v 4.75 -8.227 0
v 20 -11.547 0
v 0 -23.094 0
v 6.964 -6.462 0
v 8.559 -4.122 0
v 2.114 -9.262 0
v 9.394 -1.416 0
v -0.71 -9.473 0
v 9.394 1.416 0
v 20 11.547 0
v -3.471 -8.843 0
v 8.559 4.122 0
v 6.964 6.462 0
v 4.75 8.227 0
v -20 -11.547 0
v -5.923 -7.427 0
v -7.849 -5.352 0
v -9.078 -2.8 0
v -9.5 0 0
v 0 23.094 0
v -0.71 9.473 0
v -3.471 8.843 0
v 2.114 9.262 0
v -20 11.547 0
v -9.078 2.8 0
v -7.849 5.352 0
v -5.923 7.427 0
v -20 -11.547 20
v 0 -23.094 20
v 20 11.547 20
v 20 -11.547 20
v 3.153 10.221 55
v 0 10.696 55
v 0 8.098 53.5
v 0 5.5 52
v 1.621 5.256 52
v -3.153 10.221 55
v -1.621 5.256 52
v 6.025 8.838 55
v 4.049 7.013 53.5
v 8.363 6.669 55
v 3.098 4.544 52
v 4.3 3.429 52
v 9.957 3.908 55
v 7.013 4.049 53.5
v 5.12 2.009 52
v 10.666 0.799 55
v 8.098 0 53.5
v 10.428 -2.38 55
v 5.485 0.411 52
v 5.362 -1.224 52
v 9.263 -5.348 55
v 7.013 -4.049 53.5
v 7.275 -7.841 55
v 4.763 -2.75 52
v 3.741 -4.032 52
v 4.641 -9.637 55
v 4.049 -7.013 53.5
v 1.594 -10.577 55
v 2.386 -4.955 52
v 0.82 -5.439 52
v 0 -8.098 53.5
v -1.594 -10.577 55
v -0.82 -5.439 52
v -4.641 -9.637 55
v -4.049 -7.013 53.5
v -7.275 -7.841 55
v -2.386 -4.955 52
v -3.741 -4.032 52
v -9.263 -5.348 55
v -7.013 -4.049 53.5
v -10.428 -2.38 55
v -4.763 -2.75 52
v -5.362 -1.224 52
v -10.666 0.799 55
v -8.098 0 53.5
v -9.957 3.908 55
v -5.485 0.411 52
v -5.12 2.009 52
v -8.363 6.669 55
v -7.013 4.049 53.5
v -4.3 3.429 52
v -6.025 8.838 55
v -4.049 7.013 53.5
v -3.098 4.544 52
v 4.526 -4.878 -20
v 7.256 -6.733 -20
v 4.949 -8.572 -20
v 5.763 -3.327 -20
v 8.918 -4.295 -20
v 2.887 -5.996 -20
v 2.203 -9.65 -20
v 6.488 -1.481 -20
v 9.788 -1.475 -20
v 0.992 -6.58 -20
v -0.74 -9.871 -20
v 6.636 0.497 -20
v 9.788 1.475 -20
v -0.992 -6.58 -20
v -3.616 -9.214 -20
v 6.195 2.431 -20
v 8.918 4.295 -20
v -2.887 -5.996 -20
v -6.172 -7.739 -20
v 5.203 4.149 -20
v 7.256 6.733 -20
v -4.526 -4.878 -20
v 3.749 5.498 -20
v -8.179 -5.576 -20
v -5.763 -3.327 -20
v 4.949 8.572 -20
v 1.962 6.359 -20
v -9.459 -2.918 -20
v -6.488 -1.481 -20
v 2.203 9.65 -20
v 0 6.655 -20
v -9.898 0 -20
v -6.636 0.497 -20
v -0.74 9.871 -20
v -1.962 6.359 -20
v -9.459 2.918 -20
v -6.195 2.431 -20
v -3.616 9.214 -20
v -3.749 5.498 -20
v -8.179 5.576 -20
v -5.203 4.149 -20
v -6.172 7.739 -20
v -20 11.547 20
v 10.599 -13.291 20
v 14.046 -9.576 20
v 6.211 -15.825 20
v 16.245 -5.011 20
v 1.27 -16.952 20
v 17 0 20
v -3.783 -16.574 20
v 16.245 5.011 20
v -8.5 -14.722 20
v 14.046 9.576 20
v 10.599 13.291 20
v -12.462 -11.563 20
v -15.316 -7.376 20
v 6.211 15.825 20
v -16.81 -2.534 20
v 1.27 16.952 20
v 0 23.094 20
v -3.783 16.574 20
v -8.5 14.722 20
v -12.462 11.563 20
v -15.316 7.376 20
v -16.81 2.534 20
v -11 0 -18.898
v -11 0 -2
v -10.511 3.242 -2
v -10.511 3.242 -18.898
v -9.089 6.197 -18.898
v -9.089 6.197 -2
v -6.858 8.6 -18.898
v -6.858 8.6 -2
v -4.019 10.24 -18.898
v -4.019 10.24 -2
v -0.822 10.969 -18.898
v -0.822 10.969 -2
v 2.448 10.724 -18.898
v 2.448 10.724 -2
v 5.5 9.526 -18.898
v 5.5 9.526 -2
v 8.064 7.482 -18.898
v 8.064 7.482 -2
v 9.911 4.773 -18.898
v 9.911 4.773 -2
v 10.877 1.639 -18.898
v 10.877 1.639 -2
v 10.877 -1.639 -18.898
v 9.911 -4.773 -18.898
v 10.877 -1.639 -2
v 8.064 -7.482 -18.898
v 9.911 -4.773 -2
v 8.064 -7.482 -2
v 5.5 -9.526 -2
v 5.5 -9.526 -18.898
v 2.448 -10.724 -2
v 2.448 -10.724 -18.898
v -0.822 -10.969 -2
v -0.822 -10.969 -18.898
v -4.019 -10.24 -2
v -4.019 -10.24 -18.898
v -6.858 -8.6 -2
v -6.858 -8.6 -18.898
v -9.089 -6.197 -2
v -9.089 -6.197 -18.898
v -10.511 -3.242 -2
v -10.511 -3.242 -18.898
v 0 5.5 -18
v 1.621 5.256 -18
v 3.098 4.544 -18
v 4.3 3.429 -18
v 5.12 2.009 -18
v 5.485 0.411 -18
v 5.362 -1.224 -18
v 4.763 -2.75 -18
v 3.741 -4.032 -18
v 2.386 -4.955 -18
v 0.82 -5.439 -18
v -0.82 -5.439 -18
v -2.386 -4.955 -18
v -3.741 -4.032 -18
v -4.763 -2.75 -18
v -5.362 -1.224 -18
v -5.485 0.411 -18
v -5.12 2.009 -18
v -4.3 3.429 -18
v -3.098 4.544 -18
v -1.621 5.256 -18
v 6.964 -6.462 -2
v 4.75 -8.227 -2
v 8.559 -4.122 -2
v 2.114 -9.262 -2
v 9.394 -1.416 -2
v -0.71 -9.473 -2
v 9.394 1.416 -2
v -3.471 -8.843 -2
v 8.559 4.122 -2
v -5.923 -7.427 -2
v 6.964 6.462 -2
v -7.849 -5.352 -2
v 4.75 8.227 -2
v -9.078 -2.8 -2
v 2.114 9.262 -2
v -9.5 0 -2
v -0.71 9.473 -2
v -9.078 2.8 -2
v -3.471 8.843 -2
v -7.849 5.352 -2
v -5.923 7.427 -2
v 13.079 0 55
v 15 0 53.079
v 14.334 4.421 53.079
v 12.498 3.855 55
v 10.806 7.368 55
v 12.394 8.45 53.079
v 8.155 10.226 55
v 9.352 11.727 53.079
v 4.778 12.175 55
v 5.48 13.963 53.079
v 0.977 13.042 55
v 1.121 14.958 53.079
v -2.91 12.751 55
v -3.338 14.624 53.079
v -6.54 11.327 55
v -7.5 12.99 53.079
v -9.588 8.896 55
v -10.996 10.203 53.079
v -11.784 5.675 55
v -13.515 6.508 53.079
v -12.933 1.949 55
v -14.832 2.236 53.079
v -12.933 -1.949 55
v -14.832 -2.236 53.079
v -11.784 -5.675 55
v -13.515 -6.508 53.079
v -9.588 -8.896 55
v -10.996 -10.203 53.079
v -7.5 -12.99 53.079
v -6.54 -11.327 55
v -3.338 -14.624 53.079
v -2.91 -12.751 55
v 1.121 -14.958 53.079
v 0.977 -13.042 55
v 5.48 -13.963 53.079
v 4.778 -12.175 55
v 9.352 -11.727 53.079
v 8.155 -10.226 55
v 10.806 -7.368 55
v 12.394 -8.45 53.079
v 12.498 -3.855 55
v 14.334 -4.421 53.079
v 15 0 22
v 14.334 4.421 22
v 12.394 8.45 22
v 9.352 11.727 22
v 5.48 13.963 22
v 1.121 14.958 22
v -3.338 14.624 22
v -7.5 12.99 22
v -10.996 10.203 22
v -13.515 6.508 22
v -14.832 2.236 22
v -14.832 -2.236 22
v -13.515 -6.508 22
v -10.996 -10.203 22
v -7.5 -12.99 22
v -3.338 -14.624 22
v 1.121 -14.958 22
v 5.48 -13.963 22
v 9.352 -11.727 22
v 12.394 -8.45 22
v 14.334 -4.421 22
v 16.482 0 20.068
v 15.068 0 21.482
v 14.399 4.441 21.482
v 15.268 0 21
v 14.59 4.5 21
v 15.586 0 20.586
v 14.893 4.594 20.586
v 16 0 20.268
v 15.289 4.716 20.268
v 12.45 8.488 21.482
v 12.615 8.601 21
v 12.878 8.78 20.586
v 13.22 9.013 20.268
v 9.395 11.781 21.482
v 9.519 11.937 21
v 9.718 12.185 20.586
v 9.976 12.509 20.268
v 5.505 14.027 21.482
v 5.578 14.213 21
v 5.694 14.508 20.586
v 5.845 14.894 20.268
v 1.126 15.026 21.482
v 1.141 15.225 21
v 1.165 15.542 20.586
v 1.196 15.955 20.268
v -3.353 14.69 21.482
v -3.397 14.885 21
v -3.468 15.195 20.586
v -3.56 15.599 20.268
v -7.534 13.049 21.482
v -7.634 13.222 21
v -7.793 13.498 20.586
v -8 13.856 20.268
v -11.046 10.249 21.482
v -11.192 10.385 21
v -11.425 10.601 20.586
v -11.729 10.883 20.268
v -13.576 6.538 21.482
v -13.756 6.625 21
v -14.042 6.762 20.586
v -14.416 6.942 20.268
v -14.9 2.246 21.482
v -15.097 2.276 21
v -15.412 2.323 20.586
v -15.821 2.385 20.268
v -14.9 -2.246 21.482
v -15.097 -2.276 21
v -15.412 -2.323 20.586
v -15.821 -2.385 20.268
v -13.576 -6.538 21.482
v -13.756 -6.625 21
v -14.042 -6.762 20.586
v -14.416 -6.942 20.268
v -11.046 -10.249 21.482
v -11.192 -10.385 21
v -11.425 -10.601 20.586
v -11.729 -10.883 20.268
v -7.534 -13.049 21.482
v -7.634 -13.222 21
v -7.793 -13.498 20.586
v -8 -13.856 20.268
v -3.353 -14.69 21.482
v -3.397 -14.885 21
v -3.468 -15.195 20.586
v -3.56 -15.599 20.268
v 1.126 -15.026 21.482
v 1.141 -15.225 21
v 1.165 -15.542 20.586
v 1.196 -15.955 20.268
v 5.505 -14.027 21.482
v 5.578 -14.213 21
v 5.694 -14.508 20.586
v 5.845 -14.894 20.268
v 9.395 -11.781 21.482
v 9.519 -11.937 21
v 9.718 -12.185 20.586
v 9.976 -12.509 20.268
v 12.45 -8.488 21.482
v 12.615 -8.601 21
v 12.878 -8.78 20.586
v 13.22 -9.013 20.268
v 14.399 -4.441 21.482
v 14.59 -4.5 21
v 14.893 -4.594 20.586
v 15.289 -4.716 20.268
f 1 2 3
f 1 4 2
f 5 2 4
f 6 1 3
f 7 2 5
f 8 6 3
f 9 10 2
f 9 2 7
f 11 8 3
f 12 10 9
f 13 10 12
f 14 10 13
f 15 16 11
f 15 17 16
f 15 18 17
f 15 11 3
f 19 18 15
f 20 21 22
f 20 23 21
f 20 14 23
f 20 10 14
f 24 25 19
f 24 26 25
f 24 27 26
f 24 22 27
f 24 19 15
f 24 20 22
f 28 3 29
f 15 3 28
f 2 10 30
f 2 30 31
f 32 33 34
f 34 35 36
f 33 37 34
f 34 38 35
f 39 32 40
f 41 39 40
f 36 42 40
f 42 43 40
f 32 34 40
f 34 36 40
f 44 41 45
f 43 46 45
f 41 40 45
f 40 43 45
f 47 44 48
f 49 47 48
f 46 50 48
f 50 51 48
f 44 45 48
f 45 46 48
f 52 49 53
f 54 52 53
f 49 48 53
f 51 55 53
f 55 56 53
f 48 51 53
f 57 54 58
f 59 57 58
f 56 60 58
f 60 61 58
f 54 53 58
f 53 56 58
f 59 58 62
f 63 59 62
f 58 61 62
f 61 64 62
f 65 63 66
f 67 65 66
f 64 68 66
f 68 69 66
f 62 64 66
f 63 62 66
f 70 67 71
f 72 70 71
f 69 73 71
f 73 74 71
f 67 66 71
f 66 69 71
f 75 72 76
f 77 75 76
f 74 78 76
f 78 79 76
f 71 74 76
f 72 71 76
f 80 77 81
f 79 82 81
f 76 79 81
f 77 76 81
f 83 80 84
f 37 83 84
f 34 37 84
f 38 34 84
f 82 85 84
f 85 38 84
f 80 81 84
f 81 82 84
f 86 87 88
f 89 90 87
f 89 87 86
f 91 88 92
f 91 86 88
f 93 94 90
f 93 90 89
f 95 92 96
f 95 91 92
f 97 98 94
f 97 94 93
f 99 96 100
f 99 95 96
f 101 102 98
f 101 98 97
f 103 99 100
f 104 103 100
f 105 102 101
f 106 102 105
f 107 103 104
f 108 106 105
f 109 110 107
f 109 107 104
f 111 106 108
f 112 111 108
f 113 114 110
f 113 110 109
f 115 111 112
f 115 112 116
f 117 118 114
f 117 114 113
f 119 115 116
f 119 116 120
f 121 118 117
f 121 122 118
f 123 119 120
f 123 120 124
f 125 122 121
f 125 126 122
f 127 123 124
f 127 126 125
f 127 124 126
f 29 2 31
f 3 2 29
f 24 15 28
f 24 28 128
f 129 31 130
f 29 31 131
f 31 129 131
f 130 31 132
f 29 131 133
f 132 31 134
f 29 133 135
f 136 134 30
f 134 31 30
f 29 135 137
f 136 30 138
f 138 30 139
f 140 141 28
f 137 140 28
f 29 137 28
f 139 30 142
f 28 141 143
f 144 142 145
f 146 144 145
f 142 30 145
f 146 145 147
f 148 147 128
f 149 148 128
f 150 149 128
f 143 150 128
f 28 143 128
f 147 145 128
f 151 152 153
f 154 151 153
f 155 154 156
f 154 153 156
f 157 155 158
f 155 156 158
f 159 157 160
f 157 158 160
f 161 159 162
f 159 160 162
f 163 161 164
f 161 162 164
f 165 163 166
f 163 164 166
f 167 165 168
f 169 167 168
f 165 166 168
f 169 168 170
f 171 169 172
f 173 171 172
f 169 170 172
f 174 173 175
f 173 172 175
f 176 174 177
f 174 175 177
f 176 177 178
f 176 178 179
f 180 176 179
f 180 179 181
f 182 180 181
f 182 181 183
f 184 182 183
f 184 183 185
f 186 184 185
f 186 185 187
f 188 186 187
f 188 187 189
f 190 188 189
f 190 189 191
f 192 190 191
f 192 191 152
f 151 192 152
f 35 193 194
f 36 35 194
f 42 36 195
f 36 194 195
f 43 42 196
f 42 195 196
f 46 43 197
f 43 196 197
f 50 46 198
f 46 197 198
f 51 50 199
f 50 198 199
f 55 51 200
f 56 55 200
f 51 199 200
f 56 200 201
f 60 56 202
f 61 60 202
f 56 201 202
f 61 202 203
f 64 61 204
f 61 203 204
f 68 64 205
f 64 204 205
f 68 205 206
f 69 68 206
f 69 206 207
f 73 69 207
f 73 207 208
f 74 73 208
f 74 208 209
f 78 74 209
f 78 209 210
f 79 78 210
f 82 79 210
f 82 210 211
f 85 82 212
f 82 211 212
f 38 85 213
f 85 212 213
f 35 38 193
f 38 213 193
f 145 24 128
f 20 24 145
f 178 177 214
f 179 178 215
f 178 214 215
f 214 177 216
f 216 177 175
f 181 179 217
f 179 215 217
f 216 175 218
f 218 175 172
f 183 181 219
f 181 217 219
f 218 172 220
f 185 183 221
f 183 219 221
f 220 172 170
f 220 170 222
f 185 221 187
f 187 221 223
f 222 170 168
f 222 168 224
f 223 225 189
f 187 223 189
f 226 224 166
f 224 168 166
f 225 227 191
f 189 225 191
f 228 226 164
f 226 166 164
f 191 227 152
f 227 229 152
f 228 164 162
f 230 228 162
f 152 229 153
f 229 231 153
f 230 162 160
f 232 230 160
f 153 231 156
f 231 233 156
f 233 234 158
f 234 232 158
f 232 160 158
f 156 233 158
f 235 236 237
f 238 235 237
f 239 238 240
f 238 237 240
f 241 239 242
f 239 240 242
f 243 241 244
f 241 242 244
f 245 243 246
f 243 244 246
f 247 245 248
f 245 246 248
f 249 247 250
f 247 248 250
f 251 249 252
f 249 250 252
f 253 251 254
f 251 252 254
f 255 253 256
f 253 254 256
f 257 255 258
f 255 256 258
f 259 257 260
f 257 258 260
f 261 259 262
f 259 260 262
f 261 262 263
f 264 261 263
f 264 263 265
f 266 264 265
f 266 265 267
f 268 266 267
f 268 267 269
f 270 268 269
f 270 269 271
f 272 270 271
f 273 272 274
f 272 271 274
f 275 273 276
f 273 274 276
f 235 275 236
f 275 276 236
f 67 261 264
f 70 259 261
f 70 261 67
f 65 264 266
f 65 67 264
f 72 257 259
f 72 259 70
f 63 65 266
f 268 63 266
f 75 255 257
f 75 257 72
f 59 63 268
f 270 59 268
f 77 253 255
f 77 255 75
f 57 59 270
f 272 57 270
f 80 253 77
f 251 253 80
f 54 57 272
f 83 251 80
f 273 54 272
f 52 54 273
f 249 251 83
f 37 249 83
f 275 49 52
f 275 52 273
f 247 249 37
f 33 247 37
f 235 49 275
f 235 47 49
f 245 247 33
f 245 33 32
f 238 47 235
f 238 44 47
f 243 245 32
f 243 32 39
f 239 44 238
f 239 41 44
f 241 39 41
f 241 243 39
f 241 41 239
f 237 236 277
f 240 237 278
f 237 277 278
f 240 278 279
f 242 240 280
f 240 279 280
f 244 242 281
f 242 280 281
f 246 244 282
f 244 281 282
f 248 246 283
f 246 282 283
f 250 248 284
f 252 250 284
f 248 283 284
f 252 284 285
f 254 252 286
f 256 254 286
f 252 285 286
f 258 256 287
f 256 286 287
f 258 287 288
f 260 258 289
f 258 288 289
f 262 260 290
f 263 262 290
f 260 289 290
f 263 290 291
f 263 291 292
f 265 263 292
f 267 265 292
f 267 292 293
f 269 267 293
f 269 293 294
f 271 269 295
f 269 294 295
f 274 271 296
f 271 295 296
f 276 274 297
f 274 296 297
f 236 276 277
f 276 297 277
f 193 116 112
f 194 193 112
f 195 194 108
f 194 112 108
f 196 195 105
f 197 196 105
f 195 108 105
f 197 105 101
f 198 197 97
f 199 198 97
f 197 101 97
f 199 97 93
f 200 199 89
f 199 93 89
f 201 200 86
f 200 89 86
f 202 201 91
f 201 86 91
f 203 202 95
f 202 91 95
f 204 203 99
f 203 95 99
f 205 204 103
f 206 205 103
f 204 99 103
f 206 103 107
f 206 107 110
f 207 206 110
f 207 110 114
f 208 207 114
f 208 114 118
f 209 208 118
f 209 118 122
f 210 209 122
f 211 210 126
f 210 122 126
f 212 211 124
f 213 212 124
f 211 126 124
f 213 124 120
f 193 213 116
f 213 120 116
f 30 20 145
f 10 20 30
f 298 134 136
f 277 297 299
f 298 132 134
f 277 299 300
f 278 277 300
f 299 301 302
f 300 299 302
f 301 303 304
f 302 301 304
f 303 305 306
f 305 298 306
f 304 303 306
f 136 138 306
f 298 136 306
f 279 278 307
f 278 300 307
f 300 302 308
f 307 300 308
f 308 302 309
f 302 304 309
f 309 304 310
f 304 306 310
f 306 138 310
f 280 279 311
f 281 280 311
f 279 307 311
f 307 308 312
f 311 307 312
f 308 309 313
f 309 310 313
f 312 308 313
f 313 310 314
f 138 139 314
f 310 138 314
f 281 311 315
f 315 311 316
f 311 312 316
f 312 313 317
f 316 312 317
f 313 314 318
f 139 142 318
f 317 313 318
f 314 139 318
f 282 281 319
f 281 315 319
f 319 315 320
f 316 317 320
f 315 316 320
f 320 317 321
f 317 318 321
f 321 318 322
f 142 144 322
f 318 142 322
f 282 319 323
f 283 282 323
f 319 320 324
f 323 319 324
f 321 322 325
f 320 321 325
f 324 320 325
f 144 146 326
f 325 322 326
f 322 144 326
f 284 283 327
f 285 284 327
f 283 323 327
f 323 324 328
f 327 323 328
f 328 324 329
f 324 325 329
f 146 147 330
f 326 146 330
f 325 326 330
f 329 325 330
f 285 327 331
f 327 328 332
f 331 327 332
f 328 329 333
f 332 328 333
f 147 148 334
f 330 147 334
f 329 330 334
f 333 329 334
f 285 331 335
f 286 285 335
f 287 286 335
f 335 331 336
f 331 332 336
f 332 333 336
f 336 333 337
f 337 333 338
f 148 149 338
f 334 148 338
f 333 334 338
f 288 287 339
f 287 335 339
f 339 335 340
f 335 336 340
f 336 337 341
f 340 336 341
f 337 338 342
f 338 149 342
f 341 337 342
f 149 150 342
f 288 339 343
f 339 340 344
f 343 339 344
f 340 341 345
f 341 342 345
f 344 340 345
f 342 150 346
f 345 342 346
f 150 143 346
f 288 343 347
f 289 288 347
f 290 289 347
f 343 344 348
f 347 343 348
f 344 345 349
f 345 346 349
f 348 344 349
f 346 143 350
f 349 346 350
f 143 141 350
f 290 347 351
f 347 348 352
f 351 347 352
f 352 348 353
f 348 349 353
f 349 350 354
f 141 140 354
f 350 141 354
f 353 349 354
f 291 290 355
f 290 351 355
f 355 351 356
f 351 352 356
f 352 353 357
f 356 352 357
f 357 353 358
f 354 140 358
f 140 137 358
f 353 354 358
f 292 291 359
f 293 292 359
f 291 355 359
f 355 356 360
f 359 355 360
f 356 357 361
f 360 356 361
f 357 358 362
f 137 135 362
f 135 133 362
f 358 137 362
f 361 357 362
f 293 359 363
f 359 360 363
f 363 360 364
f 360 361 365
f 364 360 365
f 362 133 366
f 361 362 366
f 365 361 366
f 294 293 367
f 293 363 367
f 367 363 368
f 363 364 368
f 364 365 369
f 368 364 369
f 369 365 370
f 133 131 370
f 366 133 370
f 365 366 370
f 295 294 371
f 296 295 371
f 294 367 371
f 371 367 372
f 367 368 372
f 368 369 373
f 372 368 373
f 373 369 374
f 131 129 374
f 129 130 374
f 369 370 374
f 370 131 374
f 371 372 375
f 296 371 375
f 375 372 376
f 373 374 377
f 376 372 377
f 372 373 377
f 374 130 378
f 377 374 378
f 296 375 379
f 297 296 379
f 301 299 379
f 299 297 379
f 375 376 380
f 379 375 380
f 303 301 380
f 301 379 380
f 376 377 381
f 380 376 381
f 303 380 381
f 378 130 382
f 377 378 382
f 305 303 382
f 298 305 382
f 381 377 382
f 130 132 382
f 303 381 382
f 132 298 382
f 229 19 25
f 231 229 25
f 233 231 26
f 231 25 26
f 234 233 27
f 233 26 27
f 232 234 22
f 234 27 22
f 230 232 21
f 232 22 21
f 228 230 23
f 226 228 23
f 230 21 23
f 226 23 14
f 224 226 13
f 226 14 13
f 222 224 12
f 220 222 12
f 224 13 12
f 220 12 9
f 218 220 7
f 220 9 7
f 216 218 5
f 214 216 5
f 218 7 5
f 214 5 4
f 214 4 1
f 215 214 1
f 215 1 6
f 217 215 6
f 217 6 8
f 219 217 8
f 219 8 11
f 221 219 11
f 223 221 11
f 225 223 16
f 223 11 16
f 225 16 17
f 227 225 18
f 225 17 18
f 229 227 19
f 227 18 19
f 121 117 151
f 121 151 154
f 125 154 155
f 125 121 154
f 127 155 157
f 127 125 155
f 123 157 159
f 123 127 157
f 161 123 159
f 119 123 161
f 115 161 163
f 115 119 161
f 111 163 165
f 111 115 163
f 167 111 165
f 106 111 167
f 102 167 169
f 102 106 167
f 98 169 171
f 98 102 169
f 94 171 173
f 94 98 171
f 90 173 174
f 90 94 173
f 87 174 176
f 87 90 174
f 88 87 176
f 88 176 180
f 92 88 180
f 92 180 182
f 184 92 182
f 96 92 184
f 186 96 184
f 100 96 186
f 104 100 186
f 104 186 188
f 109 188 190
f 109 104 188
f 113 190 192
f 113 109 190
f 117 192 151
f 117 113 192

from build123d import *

# Parameters (mm, degrees)
SKETCH_1_R          = 17.5
EXTRUDE_1_DEPTH     = 20
SKETCH_2_R          = 15
EXTRUDE_2_DEPTH     = 35
SKETCH_3_R          = 11
EXTRUDE_3_DEPTH     = 20
CHAMFER_1_SIZE      = 1.1015
SKETCH_5_R          = 17.5
SKETCH_5_R_2        = 9.5
CUT_EXTRUDE_1_DEPTH = 2
CHAMFER_2_SIZE      = 1.921
FILLET_1_R          = 2
CHAMFER_3_SIZE      = 2
CHAMFER_3_SIZE2     = 1.154700538
SKETCH_6_R          = 17.5
EXTRUDE_4_DEPTH     = 20


with BuildPart() as part:
    # Эскиз1 → Бобышка-Вытянуть1 (new body)
    with BuildSketch(Plane.XY):
        Circle(SKETCH_1_R)
    extrude(amount=EXTRUDE_1_DEPTH)

    # Эскиз2 → Бобышка-Вытянуть2 (add)
    with BuildSketch(Plane.XY.offset(20)):
        Circle(SKETCH_2_R)
    extrude(amount=EXTRUDE_2_DEPTH)

    # Эскиз3 → Бобышка-Вытянуть3 (add)
    with BuildSketch(Plane(origin=(0, 0, 0), x_dir=(-1, 0, 0), z_dir=(0, 0, -1))):
        Circle(SKETCH_3_R)
    extrude(amount=EXTRUDE_3_DEPTH)

    # Эскиз4 → Вырез-Повернуть1 (revolve, cut)
    with BuildSketch(Plane(origin=(0, 0, 0), x_dir=(0, 0, -1), z_dir=(1, 0, 0))):
        Polygon((-55, 0), (-55, 10.696152423), (-52, 5.5), (20, 5.5), (20, 0), align=None)
    revolve(axis=Axis((0, 0, 55), (0, 0, -1)), mode=Mode.SUBTRACT)

    # Фаска1
    chamfer_1_edges = [part.edges().sort_by_distance(p)[0] for p in [
        (11, 0, -20),
    ]]
    chamfer(chamfer_1_edges, length=CHAMFER_1_SIZE)

    # Эскиз5 → Вырез-Вытянуть1 (cut)
    with BuildSketch(Plane(origin=(0, 0, 0), x_dir=(-1, 0, 0), z_dir=(0, 0, -1))):
        Circle(SKETCH_5_R)
        Circle(SKETCH_5_R_2, mode=Mode.SUBTRACT)
    extrude(amount=CUT_EXTRUDE_1_DEPTH, mode=Mode.SUBTRACT)

    # Фаска2
    chamfer_2_edges = [part.edges().sort_by_distance(p)[0] for p in [
        (-15, 0, 55),
    ]]
    chamfer(chamfer_2_edges, length=CHAMFER_2_SIZE)

    # Скругление1
    fillet_1_edges = [part.edges().sort_by_distance(p)[0] for p in [
        (-15, 0, 20),
    ]]
    fillet(fillet_1_edges, radius=FILLET_1_R)

    # Фаска3
    chamfer_3_edges = [part.edges().sort_by_distance(p)[0] for p in [
        (0, -5.5, -20),
    ]]
    chamfer_3_side = [part.faces().sort_by_distance(p)[0] for p in [
        (0, -5.5, 16),
    ]]
    chamfer(chamfer_3_edges, length=CHAMFER_3_SIZE, length2=CHAMFER_3_SIZE2, reference=chamfer_3_side[0])

    # Эскиз6 → Бобышка-Вытянуть4 (add)
    with BuildSketch(Plane(origin=(0, 0, 0), x_dir=(-1, 0, 0), z_dir=(0, 0, -1))):
        Polygon((0, 23.094010768), (-20, 11.547005384), (-20, -11.547005384), (0, -23.094010768), (20, -11.547005384), (20, 11.547005384), align=None)
        Circle(SKETCH_6_R, mode=Mode.SUBTRACT)
    extrude(amount=-EXTRUDE_4_DEPTH)


solid = part.part
